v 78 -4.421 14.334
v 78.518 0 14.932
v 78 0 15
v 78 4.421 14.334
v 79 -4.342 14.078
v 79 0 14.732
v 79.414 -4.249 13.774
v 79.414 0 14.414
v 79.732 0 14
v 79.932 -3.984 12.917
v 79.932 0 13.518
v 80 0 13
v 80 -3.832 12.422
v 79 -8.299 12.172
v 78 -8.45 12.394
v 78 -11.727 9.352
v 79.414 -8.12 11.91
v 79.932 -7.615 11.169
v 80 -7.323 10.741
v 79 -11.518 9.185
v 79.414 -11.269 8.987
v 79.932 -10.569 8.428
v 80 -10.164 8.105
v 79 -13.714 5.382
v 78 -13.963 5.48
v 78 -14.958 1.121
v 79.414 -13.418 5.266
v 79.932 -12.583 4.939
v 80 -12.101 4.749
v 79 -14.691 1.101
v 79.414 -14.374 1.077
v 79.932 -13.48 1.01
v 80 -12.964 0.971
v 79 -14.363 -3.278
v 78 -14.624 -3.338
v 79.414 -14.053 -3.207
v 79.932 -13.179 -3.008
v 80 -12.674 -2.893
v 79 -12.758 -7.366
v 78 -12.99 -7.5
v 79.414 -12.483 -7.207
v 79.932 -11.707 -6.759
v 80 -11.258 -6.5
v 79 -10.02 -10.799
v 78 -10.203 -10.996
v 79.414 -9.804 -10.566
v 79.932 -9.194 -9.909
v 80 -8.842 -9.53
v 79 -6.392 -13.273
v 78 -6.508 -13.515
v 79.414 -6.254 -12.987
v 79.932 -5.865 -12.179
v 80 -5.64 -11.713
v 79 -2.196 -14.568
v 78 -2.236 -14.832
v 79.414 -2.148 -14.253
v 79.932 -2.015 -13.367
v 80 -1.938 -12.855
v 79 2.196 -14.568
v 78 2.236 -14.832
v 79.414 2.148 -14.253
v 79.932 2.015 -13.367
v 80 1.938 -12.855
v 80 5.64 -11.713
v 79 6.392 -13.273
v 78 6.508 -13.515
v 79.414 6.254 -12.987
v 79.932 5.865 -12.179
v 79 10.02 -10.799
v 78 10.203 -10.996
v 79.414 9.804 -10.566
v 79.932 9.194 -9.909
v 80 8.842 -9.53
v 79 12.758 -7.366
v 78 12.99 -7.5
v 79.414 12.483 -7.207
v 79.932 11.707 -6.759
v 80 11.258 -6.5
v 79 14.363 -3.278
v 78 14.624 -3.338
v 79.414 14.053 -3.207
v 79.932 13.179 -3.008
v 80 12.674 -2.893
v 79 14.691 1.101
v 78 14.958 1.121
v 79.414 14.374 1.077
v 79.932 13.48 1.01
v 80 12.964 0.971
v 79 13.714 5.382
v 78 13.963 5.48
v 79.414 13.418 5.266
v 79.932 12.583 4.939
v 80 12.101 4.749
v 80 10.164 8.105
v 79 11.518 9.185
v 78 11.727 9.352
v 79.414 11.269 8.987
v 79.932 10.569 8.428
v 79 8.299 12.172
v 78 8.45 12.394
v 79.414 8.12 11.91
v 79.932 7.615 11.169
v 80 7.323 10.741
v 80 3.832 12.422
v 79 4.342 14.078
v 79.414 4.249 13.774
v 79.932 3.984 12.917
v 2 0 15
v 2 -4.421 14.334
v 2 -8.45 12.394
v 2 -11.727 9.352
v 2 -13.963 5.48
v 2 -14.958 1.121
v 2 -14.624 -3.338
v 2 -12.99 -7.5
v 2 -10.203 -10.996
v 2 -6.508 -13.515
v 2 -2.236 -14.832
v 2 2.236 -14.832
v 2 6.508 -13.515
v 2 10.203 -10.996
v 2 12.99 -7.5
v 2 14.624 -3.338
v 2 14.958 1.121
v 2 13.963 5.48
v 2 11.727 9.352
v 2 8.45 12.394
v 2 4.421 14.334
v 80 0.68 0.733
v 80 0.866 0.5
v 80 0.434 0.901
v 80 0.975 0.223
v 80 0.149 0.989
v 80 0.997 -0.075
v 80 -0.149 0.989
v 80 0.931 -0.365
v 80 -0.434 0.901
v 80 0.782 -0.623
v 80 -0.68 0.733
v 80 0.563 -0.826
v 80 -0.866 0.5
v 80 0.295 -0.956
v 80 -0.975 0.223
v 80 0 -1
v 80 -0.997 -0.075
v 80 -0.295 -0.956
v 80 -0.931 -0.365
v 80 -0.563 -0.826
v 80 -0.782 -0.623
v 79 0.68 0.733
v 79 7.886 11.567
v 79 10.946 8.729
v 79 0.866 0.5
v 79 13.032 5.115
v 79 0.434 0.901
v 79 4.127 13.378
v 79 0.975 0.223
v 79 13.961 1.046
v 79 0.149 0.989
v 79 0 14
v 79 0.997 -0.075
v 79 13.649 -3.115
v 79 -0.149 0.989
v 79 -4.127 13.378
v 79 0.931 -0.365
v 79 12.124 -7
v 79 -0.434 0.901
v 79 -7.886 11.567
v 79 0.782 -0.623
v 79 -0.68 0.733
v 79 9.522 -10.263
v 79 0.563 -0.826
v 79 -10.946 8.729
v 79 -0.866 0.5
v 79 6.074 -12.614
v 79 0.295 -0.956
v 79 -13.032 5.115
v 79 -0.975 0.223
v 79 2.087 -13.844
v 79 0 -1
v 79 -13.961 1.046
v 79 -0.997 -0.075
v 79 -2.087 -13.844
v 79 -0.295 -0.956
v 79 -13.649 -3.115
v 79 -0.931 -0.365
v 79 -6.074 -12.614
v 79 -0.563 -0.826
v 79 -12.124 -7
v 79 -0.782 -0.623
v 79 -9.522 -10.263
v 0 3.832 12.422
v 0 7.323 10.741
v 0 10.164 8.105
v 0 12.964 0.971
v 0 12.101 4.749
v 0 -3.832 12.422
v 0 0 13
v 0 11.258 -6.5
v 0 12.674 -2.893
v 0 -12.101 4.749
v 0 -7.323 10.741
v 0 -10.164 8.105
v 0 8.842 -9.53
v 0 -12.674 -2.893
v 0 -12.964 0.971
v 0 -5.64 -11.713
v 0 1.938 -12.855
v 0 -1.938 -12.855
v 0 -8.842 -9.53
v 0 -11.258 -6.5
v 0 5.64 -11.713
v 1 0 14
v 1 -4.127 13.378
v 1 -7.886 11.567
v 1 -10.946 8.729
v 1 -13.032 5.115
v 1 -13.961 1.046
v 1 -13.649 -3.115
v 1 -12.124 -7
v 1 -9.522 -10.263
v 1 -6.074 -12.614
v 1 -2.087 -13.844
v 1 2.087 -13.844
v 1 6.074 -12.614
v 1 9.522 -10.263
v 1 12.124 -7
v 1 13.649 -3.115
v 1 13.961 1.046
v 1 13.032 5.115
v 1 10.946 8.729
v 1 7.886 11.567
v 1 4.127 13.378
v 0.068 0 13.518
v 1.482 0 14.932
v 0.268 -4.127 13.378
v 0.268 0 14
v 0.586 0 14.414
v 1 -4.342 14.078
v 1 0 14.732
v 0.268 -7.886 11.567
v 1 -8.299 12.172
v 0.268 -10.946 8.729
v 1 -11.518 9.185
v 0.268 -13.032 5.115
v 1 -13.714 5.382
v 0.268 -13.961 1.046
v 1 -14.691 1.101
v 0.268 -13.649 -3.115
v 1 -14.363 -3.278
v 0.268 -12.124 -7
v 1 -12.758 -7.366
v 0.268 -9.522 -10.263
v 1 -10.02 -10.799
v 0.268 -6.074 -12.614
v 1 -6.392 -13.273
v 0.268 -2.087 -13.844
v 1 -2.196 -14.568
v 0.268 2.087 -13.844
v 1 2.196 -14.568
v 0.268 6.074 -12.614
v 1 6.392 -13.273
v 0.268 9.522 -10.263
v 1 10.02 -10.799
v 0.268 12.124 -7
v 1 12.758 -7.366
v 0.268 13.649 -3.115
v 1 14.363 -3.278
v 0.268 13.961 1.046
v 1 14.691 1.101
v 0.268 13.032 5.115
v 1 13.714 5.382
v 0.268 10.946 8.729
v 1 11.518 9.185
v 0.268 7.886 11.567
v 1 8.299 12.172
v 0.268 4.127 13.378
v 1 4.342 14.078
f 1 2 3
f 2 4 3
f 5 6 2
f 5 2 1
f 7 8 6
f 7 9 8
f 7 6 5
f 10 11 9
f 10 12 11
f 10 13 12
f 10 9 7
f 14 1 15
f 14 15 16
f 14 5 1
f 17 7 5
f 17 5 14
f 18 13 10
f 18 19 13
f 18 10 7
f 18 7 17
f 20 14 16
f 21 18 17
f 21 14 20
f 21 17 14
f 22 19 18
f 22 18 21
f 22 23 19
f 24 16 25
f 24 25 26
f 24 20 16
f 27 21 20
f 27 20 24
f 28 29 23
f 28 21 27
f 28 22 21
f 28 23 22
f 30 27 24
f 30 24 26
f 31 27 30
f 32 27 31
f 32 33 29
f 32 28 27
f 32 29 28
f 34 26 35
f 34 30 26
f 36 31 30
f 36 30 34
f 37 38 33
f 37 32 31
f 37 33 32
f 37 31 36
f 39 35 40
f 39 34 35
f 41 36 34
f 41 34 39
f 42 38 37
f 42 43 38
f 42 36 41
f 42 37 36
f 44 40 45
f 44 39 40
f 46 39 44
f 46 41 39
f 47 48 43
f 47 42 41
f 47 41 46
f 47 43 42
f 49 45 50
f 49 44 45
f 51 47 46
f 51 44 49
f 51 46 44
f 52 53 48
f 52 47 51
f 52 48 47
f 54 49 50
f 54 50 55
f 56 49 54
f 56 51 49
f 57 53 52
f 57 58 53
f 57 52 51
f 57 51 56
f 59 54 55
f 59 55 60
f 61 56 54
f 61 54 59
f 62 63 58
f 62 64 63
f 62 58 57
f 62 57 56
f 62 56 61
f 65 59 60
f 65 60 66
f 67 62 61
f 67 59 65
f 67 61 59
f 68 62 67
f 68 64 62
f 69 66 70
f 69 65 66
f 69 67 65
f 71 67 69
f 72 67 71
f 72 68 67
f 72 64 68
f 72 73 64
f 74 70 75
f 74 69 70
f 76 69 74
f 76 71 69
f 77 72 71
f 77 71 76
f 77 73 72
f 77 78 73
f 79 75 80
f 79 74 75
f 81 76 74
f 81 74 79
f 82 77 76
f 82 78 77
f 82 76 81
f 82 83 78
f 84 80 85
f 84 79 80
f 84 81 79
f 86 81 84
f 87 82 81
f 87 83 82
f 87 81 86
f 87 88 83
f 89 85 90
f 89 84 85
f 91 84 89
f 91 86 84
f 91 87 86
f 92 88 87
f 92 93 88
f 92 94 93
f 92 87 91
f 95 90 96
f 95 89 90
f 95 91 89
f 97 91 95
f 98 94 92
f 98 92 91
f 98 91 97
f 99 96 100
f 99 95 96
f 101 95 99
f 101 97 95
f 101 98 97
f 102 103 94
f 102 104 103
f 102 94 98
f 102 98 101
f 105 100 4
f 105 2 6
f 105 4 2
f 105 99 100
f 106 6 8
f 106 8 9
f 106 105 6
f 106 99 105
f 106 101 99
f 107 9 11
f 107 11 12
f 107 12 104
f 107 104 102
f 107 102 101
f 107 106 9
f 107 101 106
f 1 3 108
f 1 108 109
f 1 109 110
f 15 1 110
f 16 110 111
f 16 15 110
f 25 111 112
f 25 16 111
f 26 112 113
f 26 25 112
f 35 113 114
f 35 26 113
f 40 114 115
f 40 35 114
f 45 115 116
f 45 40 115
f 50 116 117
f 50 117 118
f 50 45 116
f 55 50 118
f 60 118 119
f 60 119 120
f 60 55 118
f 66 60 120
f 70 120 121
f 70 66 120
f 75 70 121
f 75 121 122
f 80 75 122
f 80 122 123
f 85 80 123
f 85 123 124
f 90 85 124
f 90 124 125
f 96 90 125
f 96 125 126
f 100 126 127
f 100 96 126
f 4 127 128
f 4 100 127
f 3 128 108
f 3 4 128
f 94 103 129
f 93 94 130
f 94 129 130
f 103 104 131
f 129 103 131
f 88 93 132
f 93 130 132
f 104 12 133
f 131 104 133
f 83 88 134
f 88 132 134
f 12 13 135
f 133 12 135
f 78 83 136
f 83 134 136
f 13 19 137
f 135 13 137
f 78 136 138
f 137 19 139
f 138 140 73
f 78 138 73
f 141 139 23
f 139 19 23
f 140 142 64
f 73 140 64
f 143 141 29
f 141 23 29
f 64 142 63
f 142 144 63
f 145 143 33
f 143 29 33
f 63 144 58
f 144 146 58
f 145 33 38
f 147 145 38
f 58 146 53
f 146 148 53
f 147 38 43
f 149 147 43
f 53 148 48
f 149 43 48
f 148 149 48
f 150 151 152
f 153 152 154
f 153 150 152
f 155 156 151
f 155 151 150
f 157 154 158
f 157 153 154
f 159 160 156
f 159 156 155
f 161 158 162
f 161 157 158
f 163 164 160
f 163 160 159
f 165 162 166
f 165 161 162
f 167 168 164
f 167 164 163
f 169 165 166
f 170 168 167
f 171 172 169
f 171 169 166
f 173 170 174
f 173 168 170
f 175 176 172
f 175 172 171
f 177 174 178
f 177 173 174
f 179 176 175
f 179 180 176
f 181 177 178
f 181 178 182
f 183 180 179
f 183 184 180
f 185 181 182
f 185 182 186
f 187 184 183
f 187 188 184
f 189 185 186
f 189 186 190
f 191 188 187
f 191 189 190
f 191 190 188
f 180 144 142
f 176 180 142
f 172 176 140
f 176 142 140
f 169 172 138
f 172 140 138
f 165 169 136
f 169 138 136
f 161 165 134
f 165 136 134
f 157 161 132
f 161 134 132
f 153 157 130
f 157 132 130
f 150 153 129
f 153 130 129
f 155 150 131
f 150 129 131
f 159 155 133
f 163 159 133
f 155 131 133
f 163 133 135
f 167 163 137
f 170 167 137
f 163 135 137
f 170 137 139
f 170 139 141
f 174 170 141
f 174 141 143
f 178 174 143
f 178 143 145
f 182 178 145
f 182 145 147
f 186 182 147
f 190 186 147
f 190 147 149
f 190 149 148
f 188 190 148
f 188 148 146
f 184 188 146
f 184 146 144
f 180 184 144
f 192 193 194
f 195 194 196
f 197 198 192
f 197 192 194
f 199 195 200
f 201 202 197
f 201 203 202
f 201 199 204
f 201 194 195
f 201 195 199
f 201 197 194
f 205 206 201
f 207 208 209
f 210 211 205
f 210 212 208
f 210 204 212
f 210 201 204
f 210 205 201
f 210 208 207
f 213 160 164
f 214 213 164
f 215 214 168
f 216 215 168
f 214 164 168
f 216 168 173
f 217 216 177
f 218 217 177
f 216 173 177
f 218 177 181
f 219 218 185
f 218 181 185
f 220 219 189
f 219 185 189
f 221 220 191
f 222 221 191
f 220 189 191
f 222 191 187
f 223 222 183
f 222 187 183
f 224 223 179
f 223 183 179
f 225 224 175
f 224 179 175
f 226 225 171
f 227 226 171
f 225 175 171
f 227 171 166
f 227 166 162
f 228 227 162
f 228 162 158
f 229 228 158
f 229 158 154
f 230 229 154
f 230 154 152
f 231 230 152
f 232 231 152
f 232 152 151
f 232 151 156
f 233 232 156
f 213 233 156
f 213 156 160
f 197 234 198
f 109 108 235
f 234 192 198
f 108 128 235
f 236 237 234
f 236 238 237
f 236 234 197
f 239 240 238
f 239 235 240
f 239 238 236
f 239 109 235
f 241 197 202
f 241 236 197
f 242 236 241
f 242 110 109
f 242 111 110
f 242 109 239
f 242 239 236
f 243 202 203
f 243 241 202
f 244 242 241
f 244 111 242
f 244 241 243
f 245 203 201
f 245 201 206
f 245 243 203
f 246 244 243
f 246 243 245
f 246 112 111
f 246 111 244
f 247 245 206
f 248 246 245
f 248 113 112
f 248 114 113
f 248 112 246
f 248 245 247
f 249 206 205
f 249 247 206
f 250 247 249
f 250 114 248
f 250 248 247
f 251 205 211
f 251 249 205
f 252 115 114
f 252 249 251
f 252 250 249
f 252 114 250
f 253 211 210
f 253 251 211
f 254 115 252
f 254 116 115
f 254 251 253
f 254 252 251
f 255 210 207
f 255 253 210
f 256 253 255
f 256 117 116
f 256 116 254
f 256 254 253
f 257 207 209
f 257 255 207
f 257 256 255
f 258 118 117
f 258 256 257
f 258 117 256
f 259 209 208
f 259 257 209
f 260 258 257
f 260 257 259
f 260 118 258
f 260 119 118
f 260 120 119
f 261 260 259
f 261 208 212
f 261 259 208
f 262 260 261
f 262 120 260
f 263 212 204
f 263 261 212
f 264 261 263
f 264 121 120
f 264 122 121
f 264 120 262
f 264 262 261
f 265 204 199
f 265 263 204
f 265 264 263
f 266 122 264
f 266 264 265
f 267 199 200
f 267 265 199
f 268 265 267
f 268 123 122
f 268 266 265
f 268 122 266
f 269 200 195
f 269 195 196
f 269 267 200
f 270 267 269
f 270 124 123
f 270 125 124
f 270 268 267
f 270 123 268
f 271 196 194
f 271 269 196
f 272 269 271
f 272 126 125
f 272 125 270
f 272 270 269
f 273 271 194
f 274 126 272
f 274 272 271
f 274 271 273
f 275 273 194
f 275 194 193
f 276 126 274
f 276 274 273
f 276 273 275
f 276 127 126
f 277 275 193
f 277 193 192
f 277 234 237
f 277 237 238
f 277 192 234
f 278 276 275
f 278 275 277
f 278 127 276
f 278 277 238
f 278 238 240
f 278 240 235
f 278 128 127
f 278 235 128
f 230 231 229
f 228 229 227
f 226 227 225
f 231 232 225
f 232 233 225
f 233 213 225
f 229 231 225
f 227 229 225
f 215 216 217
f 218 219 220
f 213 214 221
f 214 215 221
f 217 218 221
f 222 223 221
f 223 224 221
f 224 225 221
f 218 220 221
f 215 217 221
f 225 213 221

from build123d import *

# Parameters (mm, degrees)
SKETCH1_W          = 80
SKETCH1_H          = 15
SHELL2_T           = 1
SKETCH2_R          = 1
CUT_EXTRUDE1_DEPTH = 10
FILLET1_R          = 2


with BuildPart() as part:
    # Sketch1 → Revolve1 (revolve)
    with BuildSketch(Plane.XY, mode=Mode.PRIVATE) as revolve1_sk:
        with Locations((40, 7.5)):
            Rectangle(SKETCH1_W, SKETCH1_H)
    revolve(revolve1_sk.sketch.rotate(Axis((0, 0, 0), (1, 0, 0)), 90), axis=Axis((0, 0, 0), (1, 0, 0)))

    # Shell2 (no face opened: a closed hollow body)
    add(offset(amount=-SHELL2_T, mode=Mode.PRIVATE), mode=Mode.SUBTRACT)

    # Sketch2 → Cut-Extrude1 (cut)
    with BuildSketch(Plane(origin=(80, 0, 0), x_dir=(0, 0, -1), z_dir=(1, 0, 0))):
        Circle(SKETCH2_R)
    extrude(amount=-CUT_EXTRUDE1_DEPTH, mode=Mode.SUBTRACT)

    # Fillet1
    fillet1_edges = [part.edges().sort_by_distance(p)[0] for p in [
        (0, 0, -15),
        (80, 0, -15),
    ]]
    fillet(fillet1_edges, radius=FILLET1_R)


solid = part.part
